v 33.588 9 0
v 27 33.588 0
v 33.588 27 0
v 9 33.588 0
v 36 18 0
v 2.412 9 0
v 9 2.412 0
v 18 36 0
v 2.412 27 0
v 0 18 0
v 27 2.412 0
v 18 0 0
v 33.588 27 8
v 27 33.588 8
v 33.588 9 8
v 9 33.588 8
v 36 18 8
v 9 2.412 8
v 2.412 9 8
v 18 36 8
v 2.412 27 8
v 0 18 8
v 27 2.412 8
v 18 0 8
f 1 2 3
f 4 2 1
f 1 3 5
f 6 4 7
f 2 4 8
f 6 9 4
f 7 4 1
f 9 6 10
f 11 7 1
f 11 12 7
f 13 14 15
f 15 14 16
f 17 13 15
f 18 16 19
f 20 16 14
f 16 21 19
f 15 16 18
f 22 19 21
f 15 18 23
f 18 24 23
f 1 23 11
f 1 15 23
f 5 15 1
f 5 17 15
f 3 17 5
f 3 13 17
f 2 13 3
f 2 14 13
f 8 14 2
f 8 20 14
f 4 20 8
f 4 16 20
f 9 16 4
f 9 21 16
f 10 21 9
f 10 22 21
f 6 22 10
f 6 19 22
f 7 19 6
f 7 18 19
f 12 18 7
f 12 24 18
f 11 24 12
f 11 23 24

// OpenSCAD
$fn = 32;

// ----------------------------------------------------------------------
// Flat adaptor: keyed, 8 mm thick
// ----------------------------------------------------------------------

// --- parameters (mm) ---
profile_height = 8;       // extrusion height
profile_points = 12;      // points of the closed outline

profile = [[0, 18], [2.412, 9], [9, 2.412], [18, 0], [27, 2.412], [33.588, 9], [36, 18], [33.588, 27], [27, 33.588], [18, 36], [9, 33.588], [2.412, 27]];  // single closed polygon, 12 points, counter clockwise

// --- the one profile operation ---
linear_extrude(height = profile_height) polygon(points = profile);
